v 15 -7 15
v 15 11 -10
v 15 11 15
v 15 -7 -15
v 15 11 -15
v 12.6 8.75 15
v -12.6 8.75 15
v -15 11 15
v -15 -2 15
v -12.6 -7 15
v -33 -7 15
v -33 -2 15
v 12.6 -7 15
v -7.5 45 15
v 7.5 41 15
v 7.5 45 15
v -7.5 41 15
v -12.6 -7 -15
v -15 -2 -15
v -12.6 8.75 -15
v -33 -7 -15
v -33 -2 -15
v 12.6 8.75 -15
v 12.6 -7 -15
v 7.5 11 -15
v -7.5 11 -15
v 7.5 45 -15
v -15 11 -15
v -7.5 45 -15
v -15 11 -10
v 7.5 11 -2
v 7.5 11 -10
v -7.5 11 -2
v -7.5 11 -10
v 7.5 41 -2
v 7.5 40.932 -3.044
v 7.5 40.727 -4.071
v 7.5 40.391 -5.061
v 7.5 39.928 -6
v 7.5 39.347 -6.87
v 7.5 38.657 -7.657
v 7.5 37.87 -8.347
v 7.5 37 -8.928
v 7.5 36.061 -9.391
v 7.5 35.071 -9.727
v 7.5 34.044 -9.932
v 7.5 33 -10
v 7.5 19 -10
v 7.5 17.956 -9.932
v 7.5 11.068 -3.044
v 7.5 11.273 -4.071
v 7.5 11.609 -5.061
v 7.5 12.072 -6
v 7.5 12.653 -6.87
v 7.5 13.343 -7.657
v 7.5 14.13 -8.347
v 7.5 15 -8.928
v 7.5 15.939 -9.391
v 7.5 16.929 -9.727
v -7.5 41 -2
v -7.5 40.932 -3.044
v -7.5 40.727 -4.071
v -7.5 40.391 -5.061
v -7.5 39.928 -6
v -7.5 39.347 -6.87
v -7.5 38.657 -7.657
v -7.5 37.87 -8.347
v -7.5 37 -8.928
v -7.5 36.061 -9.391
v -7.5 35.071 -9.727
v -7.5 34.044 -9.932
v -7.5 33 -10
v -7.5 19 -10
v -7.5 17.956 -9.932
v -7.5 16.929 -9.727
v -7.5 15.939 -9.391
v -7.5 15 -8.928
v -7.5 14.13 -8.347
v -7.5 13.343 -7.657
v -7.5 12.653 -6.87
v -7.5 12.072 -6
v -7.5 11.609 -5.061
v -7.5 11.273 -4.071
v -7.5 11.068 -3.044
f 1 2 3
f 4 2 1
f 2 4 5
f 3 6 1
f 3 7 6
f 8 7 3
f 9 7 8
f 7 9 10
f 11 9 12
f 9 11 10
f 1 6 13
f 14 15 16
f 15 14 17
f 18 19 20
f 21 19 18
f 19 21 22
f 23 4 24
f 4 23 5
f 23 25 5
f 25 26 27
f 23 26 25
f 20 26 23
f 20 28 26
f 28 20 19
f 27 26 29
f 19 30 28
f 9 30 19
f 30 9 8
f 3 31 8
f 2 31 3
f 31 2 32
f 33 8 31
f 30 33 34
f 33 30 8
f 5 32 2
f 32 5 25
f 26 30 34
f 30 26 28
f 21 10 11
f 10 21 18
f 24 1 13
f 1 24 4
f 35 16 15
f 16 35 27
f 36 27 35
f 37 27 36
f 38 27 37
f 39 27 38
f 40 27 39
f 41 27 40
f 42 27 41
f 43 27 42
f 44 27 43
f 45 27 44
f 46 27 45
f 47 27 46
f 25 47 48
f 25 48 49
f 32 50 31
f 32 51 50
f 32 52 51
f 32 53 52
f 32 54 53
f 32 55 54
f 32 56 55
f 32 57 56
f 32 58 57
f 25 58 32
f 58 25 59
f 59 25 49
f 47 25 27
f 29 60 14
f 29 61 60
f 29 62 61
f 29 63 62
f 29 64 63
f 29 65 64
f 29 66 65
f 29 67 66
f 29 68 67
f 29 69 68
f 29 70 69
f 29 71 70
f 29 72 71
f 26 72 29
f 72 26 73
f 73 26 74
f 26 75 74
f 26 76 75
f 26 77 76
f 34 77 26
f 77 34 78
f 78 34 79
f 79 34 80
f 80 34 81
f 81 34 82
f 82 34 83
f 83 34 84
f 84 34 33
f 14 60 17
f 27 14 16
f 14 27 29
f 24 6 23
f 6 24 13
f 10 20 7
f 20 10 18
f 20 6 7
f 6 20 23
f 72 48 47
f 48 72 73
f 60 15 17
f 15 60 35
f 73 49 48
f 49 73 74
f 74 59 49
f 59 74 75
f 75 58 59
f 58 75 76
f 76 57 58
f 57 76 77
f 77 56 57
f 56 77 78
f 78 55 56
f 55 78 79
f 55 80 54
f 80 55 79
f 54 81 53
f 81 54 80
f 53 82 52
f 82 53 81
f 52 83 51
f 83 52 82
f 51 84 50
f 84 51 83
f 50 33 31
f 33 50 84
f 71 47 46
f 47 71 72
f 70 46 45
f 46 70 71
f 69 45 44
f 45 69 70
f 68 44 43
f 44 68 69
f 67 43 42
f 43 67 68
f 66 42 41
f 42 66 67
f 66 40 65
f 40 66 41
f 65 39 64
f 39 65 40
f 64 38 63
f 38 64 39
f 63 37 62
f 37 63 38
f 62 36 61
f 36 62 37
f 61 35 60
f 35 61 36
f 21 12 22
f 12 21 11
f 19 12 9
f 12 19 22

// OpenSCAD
difference(){
    union() {
        translate([0, 2, 0]) cube([30, 18, 30],true);
        translate([0, 20, 0]) cube([15, 50, 30],true);
        
    }
    cube([25.2, 17.5, 50],true);
    translate([0, 26, 5]) cube([35, 30, 30],true);
}

translate([0,33,-2]) rotate([0,90,180]) rotate_extrude(angle=-90, convexity=10, $fn=50) translate([10, 0, 0]) square(size=[4,15], center=true);

difference() {
translate([0,19,-2]) rotate([0,90,0]) rotate_extrude(angle=-90, convexity=10, $fn=50) translate([10, 0, 0]) square(size=[4,15], center=true);
    cube([31.5, 17.5, 50],true);
}

translate([-23,-4.5,0]) cube([20,5,30], true);
